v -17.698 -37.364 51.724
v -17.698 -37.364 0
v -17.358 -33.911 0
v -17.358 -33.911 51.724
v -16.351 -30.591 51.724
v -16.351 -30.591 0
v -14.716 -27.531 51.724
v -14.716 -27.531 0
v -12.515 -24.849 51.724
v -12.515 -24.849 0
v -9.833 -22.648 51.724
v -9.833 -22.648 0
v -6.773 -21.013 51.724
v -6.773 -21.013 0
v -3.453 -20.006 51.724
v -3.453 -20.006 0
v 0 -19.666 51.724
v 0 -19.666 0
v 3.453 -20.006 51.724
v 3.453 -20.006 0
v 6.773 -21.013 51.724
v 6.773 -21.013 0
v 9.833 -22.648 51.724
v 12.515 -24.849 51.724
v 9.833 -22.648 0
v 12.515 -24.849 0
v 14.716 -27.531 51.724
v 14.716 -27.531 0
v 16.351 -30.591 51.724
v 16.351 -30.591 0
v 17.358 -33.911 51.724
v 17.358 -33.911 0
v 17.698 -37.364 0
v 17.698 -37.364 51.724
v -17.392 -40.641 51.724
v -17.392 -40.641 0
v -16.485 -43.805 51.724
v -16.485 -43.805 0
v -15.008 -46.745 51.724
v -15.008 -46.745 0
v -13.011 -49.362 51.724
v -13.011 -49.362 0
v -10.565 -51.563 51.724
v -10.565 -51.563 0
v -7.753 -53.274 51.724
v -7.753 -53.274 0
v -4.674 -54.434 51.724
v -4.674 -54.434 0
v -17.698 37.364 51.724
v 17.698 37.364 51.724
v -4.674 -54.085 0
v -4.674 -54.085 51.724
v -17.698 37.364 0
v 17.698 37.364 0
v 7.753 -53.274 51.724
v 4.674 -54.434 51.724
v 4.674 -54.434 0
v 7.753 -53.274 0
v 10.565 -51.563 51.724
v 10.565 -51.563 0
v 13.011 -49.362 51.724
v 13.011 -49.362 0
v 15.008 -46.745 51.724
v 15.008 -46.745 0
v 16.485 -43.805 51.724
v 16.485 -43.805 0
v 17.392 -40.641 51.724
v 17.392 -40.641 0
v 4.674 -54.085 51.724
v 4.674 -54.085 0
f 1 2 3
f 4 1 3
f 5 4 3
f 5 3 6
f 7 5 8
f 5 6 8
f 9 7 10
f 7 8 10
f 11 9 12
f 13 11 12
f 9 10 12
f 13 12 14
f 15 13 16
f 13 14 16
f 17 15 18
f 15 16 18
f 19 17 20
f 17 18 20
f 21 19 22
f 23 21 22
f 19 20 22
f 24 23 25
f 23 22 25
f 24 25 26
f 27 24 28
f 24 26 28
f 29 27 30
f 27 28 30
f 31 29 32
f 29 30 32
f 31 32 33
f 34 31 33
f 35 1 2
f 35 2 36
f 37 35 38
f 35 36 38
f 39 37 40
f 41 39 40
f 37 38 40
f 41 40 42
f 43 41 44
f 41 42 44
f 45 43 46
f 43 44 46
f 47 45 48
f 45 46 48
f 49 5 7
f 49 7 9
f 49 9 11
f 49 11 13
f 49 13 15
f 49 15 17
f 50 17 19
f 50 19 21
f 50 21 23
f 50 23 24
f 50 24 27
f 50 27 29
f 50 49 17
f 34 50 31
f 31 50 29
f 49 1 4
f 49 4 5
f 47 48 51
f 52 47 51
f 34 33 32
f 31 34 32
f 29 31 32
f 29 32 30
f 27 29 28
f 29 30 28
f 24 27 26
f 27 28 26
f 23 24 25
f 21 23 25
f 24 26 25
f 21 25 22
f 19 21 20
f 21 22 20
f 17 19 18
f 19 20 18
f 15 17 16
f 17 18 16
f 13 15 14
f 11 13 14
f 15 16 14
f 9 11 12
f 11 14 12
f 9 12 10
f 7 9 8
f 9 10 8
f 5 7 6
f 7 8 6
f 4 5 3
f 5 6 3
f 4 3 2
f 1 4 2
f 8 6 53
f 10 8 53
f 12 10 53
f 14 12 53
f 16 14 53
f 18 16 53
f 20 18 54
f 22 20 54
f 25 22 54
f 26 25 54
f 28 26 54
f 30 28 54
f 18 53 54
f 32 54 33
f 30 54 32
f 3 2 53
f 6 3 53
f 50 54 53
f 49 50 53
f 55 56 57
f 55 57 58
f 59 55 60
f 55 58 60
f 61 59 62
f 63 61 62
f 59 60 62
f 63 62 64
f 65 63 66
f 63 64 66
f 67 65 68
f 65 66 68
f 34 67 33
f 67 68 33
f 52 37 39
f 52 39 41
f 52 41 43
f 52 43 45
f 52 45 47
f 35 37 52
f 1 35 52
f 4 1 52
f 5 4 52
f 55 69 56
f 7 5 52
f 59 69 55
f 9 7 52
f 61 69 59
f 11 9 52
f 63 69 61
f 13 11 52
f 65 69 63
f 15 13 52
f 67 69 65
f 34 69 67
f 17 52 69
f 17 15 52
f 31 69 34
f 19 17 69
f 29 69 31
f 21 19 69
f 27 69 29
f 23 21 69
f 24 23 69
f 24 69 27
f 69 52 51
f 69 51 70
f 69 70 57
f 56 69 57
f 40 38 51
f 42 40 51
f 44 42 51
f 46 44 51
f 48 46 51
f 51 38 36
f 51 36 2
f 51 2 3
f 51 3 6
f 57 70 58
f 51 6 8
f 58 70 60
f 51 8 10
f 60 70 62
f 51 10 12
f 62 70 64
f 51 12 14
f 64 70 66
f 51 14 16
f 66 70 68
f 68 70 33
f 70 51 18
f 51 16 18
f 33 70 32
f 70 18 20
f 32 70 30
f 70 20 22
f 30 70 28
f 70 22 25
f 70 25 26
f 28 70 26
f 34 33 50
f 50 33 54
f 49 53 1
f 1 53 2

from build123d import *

# Parameters (mm, degrees)
F2_DEPTH = 51.7236292362


with BuildPart() as f2:
    # F0 (on Top) → F2 (new body)
    with BuildSketch(Plane.XY):
        with BuildLine():
            Line((-17.6984570841, -37.3641554262), (17.6984570841, -37.3641554262))
            ThreePointArc((17.6984570841, -37.3641554262), (0, -19.665698342), (-17.6984570841, -37.3641554262))
        make_face()
        with BuildLine():
            ThreePointArc((4.6735760674, -54.4343947303), (14.0703672414, -48.1000833716), (17.6984570841, -37.3641554262))
            Line((17.6984570841, -37.3641554262), (-17.6984570841, -37.3641554262))
            ThreePointArc((-17.6984570841, -37.3641554262), (-14.0703672414, -48.1000833716), (-4.6735760674, -54.4343947303))
            Line((-4.6735760674, -54.4343947303), (-4.6735760674, -54.0850054095))
            Line((-4.6735760674, -54.0850054095), (4.6735760674, -54.0850054095))
            Line((4.6735760674, -54.0850054095), (4.6735760674, -54.4343947303))
        make_face()
    extrude(amount=F2_DEPTH)


with BuildPart() as f2b:
    # F1 (on face) → F2, piece 2 (new body)
    with BuildSketch(Plane.XY):
        with BuildLine():
            ThreePointArc((-17.6984570841, -37.3641554262), (0, -19.665698342), (17.6984570841, -37.3641554262))
            Line((17.6984570841, -37.3641554262), (17.6984570841, 37.3641554262))
            Line((17.6984570841, 37.3641554262), (-17.6984570841, 37.3641554262))
            Line((-17.6984570841, 37.3641554262), (-17.6984570841, -37.3641554262))
        make_face()
    extrude(amount=F2_DEPTH)


solid = Compound([f2.part, f2b.part])
